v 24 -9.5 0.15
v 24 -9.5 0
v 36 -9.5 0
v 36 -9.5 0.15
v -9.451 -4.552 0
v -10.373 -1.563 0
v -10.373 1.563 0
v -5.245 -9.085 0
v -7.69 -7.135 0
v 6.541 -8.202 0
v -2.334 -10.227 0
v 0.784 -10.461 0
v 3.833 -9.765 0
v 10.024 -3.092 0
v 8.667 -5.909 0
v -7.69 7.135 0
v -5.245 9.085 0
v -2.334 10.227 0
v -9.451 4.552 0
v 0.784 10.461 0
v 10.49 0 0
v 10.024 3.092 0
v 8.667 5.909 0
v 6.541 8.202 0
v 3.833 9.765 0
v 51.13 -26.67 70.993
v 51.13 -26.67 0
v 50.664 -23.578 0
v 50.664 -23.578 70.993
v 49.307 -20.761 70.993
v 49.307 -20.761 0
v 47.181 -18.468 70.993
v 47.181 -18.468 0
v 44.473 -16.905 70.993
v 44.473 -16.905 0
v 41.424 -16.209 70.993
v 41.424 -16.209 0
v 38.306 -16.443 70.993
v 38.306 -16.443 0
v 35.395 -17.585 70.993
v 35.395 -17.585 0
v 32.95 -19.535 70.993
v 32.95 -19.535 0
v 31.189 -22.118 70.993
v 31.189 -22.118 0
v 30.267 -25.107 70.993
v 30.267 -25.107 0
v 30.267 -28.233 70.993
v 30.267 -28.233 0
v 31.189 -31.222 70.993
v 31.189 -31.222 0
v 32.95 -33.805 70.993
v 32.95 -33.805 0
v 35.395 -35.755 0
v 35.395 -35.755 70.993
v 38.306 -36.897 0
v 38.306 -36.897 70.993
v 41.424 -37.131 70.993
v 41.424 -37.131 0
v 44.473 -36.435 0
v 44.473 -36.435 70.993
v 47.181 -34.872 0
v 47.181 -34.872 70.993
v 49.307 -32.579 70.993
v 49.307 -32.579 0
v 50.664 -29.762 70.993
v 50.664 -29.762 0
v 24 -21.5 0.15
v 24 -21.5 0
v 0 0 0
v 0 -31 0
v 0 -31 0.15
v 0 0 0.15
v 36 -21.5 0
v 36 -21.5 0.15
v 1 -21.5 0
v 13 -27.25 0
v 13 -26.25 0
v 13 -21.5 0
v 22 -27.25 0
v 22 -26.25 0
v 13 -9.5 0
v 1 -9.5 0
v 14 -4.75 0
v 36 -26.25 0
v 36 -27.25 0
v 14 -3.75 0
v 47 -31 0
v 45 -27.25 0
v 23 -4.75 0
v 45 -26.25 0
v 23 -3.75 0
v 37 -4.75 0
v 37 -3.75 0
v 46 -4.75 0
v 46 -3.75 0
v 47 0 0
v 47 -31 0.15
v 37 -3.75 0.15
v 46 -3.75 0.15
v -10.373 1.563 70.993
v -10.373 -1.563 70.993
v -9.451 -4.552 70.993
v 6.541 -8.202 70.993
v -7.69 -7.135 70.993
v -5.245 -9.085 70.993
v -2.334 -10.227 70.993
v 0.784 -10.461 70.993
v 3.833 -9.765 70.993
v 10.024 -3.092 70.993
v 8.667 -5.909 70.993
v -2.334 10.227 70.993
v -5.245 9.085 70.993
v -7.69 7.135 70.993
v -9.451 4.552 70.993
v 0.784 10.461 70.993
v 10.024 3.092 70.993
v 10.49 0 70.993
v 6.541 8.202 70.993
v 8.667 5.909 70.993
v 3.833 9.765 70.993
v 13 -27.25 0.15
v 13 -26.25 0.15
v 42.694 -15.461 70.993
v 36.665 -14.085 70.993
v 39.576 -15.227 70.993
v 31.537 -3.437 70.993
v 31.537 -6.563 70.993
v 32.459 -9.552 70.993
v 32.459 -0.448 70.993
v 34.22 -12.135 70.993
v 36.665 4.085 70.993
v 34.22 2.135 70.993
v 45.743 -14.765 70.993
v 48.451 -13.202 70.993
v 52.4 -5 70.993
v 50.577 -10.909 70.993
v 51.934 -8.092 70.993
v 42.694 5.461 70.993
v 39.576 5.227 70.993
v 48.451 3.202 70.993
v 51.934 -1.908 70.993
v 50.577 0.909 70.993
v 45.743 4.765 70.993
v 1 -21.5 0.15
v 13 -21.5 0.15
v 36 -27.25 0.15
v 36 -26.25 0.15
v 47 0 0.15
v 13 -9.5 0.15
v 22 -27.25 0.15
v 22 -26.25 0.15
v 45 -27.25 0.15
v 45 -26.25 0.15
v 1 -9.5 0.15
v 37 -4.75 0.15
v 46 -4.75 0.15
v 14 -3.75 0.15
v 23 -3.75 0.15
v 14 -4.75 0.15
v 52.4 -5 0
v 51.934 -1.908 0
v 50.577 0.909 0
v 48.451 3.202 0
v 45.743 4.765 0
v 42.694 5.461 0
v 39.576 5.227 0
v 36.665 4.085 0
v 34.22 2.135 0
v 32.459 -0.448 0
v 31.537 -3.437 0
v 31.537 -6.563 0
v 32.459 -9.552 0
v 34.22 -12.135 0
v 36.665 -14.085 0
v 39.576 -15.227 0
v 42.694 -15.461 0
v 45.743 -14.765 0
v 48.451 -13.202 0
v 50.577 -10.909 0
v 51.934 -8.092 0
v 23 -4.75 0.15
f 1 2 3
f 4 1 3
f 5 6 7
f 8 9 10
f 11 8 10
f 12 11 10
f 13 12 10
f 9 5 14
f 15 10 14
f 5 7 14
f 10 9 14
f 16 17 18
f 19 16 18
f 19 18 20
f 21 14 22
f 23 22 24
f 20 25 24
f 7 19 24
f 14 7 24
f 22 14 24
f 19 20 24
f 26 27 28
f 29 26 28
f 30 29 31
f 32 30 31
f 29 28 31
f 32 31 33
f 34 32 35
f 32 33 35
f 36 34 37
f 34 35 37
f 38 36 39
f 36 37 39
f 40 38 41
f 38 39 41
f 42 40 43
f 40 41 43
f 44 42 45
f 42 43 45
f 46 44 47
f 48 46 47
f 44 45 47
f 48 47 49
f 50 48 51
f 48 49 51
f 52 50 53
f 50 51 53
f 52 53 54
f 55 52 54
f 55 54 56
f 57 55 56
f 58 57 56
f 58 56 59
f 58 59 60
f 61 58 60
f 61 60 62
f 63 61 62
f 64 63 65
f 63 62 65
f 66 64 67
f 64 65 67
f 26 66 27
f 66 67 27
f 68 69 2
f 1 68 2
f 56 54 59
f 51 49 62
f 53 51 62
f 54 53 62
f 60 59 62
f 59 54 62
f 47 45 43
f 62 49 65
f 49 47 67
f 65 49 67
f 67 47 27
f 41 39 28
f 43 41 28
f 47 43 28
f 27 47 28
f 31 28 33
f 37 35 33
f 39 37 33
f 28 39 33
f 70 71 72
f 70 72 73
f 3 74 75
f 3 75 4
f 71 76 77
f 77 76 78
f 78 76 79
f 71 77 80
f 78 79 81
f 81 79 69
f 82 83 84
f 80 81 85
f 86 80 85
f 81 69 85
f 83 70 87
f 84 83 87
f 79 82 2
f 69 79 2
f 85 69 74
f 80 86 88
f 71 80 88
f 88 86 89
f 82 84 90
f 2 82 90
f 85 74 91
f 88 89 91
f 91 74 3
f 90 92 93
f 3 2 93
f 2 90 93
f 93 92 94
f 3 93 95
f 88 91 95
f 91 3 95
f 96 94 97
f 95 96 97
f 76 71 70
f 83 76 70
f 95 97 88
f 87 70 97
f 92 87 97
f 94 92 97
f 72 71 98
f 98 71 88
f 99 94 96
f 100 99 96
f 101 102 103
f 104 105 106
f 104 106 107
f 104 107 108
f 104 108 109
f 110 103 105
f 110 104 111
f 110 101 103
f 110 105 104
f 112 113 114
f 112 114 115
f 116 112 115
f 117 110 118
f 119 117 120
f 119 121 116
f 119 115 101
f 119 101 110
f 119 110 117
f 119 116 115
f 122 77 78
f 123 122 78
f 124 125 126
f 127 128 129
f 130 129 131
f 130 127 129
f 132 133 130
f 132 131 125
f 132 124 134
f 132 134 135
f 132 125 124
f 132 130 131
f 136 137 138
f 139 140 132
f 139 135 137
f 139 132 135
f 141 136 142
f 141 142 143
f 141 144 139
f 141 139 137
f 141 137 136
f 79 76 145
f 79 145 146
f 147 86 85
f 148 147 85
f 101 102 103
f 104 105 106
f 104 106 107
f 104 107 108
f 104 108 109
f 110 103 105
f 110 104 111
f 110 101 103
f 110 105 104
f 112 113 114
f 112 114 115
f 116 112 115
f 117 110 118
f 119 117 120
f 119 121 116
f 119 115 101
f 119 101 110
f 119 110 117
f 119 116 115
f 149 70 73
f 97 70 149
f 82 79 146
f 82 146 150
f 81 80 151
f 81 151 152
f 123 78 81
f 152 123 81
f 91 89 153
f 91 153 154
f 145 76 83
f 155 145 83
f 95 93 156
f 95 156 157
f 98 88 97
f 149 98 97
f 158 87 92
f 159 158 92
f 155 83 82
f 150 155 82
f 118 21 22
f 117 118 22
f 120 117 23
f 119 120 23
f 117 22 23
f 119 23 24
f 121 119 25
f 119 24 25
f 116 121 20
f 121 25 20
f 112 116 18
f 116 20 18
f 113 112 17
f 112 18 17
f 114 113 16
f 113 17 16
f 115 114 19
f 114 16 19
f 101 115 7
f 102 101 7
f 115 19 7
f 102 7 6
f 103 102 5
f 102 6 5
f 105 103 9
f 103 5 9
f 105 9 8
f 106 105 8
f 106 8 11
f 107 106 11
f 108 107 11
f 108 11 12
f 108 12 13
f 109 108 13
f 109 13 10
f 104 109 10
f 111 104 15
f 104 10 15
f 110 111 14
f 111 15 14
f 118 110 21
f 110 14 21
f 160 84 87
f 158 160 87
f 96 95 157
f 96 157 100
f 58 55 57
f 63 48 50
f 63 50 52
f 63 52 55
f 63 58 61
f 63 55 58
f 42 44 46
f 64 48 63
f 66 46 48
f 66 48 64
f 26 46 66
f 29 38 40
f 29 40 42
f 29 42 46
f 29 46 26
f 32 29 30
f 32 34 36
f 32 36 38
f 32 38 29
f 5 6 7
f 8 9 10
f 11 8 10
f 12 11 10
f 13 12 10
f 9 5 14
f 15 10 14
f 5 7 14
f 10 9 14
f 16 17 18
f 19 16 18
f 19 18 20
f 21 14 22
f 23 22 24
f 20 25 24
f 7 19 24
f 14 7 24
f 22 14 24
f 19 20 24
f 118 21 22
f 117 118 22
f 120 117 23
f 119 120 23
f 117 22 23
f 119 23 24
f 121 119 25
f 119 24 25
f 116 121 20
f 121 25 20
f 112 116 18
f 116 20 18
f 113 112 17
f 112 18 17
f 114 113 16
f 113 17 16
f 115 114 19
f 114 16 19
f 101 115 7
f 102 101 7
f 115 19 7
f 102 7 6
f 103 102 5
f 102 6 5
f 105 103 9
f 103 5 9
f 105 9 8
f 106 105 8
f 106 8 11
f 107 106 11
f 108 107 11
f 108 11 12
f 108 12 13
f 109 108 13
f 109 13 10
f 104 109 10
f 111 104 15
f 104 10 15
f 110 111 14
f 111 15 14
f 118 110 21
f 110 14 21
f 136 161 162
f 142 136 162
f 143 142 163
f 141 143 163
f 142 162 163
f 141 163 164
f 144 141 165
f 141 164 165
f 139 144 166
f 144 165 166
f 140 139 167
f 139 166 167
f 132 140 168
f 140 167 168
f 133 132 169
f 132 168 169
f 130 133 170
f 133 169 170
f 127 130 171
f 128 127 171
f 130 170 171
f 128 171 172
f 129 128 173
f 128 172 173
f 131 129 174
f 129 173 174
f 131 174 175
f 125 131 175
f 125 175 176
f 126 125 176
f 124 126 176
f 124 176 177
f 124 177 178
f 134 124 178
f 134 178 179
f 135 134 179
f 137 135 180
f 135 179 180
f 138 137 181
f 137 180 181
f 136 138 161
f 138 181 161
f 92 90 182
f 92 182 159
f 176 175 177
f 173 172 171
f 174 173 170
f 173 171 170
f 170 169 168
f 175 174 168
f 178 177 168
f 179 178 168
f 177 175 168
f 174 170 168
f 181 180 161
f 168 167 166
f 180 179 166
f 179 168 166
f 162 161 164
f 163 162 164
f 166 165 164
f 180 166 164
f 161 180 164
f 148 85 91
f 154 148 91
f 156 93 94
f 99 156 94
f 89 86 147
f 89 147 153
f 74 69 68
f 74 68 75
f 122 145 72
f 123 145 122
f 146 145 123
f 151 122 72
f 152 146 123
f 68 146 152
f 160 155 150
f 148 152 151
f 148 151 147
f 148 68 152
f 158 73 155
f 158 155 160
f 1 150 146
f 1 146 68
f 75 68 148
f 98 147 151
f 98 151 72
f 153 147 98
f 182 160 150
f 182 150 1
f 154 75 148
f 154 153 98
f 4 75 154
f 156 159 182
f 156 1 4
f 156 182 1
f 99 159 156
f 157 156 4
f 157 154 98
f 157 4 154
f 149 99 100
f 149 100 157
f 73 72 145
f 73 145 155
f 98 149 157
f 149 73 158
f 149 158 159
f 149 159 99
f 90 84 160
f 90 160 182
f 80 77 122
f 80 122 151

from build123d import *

# Parameters (mm, degrees)
CYLINDER_R        = 10.4902
CYLINDER_DEPTH    = 70.993
SKETCH_W          = 47
SKETCH_H          = 31
SKETCH_W_2        = 12
SKETCH_H_2        = 12
SKETCH_W_3        = 9
SKETCH_H_3        = 1
PAD_DEPTH         = 0.15
CYLINDER001_R     = 10.4902
CYLINDER001_DEPTH = 70.993
CYLINDER002_R     = 10.4902
CYLINDER002_DEPTH = 70.993
CYLINDER003_R     = 10.4902
CYLINDER003_DEPTH = 70.993


with BuildPart() as cylinder:
    # Cylinder → Cylinder (new body)
    with BuildSketch(Plane.XY):
        Circle(CYLINDER_R)
    extrude(amount=CYLINDER_DEPTH)


with BuildPart() as body:
    # Sketch → Pad (new body)
    with BuildSketch(Plane.XY):
        with Locations((23.5, -15.5)):
            Rectangle(SKETCH_W, SKETCH_H)
        with Locations((7, -15.5)):
            Rectangle(SKETCH_W_2, SKETCH_H_2, mode=Mode.SUBTRACT)
        with Locations((18.5, -4.25)):
            Rectangle(SKETCH_W_3, SKETCH_H_3, mode=Mode.SUBTRACT)
        with Locations((17.5, -26.75)):
            Rectangle(SKETCH_W_3, SKETCH_H_3, mode=Mode.SUBTRACT)
        with Locations((30, -15.5)):
            Rectangle(SKETCH_W_2, SKETCH_H_2, mode=Mode.SUBTRACT)
        with Locations((41.5, -4.25)):
            Rectangle(SKETCH_W_3, SKETCH_H_3, mode=Mode.SUBTRACT)
        with Locations((40.5, -26.75)):
            Rectangle(SKETCH_W_3, SKETCH_H_3, mode=Mode.SUBTRACT)
    extrude(amount=PAD_DEPTH)


with BuildPart() as cylinder001:
    # Cylinder001 → Cylinder001 (new body)
    with BuildSketch(Plane(origin=(41.91, -5, 0), x_dir=(1, 0, 0), z_dir=(0, 0, 1))):
        Circle(CYLINDER001_R)
    extrude(amount=CYLINDER001_DEPTH)


with BuildPart() as cylinder002:
    # Cylinder002 → Cylinder002 (new body)
    with BuildSketch(Plane(origin=(40.64, -26.67, 0), x_dir=(1, 0, 0), z_dir=(0, 0, 1))):
        Circle(CYLINDER002_R)
    extrude(amount=CYLINDER002_DEPTH)


with BuildPart() as cylinder003:
    # Cylinder003 → Cylinder003 (new body)
    with BuildSketch(Plane.XY):
        Circle(CYLINDER003_R)
    extrude(amount=CYLINDER003_DEPTH)


solid = Compound([cylinder.part, body.part, cylinder001.part, cylinder002.part, cylinder003.part])
